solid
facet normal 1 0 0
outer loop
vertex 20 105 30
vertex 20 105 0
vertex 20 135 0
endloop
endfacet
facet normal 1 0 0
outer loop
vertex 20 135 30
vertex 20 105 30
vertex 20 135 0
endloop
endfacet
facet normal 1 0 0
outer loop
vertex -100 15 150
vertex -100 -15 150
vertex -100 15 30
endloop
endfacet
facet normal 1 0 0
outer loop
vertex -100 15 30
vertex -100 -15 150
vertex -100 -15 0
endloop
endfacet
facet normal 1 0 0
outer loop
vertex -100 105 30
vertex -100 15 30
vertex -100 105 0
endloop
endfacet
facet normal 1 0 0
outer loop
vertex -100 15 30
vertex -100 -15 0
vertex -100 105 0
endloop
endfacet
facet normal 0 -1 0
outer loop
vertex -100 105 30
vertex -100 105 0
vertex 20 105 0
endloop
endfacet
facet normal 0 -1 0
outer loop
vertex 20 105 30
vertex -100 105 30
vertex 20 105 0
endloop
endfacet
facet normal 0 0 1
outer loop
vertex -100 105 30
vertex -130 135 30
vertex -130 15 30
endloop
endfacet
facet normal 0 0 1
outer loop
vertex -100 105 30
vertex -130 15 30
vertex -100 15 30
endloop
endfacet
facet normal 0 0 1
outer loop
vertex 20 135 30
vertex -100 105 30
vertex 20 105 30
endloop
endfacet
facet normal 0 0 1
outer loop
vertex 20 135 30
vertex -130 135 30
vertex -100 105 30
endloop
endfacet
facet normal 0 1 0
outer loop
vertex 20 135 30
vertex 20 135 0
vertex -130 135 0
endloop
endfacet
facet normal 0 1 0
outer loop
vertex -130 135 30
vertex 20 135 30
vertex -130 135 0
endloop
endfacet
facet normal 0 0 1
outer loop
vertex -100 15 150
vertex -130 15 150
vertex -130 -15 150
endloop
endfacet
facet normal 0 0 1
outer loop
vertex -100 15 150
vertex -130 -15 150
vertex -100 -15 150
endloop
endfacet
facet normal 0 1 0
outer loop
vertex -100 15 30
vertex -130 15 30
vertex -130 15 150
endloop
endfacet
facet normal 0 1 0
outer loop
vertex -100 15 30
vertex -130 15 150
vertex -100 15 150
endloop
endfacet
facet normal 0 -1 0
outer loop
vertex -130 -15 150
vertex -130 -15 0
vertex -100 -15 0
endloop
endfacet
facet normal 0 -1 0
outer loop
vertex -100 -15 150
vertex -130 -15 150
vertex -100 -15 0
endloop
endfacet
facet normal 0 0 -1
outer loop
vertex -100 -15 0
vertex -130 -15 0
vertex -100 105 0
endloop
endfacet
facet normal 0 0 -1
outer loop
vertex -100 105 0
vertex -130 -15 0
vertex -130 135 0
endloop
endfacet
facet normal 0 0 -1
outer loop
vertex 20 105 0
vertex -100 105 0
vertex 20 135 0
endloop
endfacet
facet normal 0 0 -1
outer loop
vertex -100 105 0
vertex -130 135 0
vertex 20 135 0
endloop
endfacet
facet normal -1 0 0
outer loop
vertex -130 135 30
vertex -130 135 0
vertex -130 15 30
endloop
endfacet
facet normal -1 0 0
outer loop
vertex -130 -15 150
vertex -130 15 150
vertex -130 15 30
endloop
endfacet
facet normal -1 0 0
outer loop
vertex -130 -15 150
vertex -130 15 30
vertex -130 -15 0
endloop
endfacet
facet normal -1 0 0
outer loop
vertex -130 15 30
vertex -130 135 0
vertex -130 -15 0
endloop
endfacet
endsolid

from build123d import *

# Parameters (mm, degrees)
SALIENTE_EXTRUIR1_DEPTH = 30
CROQUIS2_W              = 30
CROQUIS2_H              = 30
SALIENTE_EXTRUIR3_DEPTH = 150


with BuildPart() as part:
    # Croquis1 → Saliente-Extruir1 (new body)
    with BuildSketch(Plane.XY):
        Polygon((-130, 135), (-130, -15), (-100, -15), (-100, 105), (20, 105), (20, 135), align=None)
    extrude(amount=SALIENTE_EXTRUIR1_DEPTH)

    # Croquis2 → Saliente-Extruir3 (add)
    with BuildSketch(Plane.XY):
        with Locations((-115, 0)):
            Rectangle(CROQUIS2_W, CROQUIS2_H)
    extrude(amount=SALIENTE_EXTRUIR3_DEPTH)


solid = part.part
